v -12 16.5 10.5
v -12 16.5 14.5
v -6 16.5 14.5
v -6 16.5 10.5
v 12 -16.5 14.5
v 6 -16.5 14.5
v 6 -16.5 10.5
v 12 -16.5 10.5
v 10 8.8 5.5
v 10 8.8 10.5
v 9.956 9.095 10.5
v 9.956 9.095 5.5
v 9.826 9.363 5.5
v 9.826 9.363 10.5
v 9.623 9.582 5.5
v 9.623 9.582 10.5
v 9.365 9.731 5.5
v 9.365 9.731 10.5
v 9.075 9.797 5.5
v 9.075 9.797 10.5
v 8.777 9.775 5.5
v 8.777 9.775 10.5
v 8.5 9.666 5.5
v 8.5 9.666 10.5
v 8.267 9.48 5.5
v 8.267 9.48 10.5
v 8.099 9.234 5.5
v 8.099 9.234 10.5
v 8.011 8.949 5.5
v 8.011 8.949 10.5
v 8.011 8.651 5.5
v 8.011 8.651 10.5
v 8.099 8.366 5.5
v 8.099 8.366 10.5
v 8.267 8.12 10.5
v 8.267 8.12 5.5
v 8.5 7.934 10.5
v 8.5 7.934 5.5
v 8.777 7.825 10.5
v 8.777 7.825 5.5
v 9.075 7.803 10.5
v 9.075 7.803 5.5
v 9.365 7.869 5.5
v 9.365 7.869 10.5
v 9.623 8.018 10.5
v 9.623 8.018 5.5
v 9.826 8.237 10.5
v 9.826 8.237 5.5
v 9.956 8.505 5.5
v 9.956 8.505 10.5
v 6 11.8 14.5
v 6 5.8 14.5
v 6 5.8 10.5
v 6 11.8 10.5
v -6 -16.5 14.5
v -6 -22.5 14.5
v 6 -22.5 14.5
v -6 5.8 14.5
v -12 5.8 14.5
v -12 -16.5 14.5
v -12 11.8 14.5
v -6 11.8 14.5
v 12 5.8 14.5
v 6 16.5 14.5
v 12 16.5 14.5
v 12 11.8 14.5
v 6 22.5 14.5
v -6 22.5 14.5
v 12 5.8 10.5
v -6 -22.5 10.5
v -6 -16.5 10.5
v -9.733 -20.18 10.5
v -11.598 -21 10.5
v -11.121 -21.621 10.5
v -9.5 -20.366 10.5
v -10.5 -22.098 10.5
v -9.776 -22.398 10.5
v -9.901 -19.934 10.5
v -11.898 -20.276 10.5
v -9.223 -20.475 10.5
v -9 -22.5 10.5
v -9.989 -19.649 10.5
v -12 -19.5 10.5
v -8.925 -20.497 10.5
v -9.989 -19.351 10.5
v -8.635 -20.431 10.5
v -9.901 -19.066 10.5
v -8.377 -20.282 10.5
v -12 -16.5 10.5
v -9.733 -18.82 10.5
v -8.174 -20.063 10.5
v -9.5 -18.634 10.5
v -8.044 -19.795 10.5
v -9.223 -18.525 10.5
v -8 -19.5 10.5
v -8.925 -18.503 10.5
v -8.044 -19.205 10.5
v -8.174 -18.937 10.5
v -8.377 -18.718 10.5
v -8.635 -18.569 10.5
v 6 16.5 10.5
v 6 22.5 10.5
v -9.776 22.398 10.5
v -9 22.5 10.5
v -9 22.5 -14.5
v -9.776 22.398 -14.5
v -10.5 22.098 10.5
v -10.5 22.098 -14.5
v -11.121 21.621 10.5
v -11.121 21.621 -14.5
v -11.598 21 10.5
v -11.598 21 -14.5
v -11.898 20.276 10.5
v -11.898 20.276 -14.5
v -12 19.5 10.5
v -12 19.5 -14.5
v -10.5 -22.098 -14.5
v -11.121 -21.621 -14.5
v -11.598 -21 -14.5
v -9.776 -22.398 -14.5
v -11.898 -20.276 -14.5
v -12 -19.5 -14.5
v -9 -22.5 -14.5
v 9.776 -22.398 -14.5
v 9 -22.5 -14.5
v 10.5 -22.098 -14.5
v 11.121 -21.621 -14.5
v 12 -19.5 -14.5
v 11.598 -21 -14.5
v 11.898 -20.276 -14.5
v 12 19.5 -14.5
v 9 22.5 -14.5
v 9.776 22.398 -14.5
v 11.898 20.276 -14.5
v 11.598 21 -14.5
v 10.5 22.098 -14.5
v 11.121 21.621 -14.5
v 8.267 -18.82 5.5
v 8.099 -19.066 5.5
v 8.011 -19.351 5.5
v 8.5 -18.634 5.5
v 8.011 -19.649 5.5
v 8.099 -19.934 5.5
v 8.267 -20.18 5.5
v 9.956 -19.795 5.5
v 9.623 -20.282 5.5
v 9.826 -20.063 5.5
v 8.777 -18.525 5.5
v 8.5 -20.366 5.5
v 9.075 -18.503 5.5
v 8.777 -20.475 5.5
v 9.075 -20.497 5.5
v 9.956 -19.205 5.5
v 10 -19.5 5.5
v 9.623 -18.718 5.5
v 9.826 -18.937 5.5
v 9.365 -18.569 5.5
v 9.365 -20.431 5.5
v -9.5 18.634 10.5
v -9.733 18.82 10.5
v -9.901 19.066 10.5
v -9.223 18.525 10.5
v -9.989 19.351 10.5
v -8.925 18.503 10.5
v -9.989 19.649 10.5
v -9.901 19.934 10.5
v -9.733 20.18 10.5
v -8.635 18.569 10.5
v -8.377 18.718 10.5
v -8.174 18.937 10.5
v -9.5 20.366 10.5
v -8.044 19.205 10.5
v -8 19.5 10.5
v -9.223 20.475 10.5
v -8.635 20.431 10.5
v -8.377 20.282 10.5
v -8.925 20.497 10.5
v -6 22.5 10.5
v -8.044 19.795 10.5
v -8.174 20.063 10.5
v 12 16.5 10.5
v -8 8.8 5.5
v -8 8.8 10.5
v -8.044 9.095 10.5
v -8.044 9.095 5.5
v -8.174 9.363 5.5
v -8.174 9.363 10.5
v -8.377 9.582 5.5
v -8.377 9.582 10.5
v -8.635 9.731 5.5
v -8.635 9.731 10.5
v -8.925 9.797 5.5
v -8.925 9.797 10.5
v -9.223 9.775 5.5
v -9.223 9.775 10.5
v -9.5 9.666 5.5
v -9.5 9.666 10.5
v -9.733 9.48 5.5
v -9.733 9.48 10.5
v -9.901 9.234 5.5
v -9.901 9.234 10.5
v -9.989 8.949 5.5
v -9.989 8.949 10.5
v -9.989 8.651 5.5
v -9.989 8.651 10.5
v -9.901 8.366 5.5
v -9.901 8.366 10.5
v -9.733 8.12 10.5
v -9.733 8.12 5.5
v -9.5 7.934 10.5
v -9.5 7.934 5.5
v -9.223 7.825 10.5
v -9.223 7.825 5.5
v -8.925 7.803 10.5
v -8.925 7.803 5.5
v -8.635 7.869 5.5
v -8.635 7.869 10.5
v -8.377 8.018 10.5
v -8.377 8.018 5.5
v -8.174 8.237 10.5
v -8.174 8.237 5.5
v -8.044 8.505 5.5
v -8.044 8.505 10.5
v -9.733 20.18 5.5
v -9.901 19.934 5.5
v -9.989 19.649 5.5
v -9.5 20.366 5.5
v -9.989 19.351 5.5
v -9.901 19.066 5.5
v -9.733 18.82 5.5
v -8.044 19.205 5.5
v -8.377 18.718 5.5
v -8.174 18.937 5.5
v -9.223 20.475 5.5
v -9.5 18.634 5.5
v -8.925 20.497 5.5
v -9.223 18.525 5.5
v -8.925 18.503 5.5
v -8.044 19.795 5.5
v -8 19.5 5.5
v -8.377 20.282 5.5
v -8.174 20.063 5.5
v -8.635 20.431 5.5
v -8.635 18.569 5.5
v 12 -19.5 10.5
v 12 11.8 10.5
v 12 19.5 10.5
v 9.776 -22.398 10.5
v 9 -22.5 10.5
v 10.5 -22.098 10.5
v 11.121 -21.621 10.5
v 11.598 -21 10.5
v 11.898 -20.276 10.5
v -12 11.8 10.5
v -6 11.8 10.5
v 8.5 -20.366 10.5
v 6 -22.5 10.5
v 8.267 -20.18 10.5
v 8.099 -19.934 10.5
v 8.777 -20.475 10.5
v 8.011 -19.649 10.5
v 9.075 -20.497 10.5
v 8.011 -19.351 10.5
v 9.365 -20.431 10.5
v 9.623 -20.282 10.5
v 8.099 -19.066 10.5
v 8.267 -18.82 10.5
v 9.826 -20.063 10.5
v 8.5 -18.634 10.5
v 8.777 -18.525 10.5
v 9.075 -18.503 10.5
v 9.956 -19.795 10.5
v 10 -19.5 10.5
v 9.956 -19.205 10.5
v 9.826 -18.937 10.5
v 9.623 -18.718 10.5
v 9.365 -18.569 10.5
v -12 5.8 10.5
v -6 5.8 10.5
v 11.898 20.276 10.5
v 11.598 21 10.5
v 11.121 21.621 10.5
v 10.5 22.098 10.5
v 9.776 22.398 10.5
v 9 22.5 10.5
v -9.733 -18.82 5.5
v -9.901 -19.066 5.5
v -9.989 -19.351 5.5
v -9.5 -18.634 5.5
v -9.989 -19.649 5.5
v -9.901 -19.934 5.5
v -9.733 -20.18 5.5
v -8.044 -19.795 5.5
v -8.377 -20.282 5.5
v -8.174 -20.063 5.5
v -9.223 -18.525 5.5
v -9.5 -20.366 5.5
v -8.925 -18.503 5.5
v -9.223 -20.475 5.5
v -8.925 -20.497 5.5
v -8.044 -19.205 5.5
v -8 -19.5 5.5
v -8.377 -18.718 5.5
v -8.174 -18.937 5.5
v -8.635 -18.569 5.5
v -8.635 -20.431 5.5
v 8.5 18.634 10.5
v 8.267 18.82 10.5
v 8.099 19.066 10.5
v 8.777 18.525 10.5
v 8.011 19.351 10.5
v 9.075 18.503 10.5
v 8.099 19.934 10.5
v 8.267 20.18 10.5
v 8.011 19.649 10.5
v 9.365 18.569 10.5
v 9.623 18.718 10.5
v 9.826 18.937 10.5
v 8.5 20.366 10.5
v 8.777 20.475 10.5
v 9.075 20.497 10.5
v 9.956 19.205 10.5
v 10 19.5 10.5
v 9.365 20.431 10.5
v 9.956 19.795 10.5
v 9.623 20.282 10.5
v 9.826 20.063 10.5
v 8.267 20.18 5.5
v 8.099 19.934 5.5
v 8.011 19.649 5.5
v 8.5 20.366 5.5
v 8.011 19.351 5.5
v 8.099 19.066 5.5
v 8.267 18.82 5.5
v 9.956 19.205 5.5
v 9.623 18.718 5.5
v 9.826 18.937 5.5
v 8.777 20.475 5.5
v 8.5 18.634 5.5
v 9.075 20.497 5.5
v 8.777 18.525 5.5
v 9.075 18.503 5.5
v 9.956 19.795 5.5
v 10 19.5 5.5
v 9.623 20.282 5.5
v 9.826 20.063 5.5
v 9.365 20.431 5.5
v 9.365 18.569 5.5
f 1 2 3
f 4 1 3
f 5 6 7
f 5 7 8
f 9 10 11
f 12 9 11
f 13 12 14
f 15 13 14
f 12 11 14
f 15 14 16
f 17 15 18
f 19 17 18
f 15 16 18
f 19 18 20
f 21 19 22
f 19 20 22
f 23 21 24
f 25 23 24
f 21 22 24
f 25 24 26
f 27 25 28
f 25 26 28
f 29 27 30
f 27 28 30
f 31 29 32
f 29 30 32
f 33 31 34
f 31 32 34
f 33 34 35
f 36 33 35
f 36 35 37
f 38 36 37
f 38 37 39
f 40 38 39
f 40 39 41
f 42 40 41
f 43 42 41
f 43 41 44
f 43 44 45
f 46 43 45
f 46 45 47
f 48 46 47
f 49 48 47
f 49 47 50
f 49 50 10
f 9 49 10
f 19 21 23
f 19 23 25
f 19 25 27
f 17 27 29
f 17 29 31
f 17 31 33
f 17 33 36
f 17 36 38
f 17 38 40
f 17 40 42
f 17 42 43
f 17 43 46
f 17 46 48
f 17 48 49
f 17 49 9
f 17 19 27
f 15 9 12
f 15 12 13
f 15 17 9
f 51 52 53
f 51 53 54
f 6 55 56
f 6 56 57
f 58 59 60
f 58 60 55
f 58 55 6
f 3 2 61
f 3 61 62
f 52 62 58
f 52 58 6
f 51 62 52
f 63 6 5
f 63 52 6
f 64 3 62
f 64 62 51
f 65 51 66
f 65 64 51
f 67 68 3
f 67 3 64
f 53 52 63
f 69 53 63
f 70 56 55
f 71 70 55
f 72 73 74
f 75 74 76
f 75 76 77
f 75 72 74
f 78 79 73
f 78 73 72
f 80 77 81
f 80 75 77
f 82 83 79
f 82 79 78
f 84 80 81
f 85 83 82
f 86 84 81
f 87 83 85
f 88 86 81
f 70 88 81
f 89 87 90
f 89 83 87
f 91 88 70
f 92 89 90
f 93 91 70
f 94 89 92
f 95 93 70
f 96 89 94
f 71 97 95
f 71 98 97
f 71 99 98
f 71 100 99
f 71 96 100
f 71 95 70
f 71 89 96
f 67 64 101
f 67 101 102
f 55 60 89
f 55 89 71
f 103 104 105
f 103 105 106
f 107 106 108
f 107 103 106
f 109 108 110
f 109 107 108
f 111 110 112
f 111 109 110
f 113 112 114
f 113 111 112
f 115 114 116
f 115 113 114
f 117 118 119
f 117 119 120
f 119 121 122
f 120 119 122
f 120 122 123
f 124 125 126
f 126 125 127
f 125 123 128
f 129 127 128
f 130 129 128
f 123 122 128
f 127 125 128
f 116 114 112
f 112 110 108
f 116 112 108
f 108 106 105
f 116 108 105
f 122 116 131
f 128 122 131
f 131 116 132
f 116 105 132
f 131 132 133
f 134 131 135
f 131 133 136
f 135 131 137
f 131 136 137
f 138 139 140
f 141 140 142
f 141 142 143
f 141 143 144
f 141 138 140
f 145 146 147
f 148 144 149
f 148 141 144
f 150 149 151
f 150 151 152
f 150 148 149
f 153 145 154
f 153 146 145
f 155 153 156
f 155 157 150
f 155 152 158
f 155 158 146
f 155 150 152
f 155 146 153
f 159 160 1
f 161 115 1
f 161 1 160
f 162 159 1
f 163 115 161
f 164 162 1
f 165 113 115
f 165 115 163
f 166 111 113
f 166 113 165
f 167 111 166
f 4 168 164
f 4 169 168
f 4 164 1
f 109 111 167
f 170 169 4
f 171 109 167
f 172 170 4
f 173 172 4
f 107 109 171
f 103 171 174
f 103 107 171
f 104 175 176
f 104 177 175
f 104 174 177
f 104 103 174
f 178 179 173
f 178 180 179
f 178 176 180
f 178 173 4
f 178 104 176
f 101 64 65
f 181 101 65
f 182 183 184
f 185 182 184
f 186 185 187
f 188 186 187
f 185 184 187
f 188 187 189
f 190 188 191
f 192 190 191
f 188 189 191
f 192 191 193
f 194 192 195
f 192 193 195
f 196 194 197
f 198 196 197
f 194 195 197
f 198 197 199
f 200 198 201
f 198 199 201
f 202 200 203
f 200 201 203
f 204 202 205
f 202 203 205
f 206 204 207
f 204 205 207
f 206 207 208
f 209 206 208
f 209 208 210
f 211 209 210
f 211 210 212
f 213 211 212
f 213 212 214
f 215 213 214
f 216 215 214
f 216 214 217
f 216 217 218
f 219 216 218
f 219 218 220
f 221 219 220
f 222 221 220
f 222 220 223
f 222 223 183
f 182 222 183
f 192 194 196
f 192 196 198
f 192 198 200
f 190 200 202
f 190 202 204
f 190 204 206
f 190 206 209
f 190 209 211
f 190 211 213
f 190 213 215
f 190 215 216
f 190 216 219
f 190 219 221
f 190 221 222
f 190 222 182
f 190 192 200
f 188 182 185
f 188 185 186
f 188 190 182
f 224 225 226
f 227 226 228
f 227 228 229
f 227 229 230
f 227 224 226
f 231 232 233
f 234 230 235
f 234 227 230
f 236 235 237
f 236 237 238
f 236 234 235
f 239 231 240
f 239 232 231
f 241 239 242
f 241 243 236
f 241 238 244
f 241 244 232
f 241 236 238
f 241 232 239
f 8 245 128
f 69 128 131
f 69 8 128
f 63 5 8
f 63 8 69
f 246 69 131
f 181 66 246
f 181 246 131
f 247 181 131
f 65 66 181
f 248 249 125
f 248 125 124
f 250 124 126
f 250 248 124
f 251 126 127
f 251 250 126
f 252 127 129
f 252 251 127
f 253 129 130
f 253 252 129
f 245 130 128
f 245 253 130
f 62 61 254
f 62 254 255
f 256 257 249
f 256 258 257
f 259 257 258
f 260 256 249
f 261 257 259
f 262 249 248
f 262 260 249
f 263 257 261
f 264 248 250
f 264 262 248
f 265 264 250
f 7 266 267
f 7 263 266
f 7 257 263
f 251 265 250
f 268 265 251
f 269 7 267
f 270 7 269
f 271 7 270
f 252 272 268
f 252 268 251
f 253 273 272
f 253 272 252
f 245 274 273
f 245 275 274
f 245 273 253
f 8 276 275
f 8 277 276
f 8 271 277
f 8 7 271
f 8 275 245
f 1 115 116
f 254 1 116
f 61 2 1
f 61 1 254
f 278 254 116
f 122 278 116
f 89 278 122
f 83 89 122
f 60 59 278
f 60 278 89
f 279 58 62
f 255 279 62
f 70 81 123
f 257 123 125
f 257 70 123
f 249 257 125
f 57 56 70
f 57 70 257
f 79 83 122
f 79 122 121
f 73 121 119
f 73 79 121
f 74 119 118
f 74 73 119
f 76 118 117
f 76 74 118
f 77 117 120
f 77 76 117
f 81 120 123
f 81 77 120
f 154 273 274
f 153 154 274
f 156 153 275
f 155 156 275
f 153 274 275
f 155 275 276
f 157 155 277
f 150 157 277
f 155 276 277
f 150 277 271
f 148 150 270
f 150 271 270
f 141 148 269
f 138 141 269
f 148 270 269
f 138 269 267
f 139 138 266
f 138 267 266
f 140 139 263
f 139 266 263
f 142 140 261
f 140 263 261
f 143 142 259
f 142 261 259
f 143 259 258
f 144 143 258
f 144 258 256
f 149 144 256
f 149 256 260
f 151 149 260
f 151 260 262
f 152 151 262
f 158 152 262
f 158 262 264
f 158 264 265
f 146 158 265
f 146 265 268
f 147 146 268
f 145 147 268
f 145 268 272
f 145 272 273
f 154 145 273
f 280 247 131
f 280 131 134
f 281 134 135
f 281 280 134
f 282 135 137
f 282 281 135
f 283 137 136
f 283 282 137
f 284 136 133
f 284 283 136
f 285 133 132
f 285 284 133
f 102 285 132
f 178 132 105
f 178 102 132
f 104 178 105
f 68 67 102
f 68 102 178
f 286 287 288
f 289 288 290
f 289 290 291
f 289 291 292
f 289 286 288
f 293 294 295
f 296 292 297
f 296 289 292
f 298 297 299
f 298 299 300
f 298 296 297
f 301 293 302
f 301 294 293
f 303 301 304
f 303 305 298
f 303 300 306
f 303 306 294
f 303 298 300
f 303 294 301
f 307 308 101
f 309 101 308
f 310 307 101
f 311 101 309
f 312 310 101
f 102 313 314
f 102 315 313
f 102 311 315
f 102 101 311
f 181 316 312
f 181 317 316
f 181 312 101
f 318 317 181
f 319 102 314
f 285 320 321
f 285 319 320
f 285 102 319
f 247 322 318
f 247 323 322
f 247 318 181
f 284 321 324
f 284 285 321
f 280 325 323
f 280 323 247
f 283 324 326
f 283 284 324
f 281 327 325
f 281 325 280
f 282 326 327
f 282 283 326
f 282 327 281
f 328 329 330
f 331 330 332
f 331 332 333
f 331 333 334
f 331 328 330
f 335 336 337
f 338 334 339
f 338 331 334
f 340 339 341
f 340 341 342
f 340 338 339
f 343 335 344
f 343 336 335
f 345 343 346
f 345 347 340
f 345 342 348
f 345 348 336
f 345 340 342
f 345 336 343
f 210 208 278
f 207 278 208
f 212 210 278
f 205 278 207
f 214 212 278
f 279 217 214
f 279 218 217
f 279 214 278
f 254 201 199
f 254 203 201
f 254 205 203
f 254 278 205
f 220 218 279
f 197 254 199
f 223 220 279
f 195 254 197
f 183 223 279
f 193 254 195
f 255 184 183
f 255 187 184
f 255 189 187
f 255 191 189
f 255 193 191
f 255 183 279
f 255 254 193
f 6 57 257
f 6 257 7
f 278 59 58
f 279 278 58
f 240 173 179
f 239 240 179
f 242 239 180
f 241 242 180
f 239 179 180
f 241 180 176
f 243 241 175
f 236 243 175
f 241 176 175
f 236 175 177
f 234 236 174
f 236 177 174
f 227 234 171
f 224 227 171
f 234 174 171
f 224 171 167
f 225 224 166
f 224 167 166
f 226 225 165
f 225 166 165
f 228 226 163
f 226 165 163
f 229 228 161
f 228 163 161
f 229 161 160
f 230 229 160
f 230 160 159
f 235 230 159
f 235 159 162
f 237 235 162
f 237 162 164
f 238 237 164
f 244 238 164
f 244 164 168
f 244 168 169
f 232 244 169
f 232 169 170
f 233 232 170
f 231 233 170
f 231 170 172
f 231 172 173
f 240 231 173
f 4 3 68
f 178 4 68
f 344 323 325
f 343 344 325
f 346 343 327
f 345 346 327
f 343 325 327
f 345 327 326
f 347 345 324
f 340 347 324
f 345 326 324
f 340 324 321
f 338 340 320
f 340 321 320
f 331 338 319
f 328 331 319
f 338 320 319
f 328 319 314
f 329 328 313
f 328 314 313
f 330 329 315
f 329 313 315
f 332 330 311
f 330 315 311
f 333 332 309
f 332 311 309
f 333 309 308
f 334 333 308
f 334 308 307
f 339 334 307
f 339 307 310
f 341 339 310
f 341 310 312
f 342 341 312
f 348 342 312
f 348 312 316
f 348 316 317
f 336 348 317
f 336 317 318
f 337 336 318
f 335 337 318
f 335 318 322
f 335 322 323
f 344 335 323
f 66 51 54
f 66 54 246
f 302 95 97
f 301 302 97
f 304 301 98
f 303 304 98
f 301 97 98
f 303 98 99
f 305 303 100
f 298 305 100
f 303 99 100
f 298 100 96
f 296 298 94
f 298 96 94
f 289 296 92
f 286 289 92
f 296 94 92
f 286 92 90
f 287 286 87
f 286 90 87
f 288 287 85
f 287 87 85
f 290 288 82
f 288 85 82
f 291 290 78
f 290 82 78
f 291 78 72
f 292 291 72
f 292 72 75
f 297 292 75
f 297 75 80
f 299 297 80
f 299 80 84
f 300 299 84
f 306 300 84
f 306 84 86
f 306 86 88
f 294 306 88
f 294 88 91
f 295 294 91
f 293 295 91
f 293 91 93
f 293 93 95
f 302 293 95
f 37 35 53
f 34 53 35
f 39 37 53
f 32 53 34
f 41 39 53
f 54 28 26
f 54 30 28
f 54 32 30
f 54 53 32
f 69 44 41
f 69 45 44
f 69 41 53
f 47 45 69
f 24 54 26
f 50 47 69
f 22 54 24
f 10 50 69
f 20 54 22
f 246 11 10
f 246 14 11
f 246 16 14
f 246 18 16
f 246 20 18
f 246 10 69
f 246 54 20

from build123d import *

# Parameters (mm, degrees)
BOSS_EXTRU_1_DEPTH      = 14.5
ESQUISSE2_R             = 1
ENL_V_MAT_EXTRU_1_DEPTH = 9
ESQUISSE4_W             = 6
ESQUISSE4_H             = 6
ENL_V_MAT_EXTRU_2_DEPTH = 4


with BuildPart() as part:
    # Esquisse1 → Boss.-Extru.1 (new, symmetric)
    with BuildSketch(Plane.XY):
        with BuildLine():
            Line((-9, -22.5), (9, -22.5))
            ThreePointArc((9, -22.5), (11.121320344, -21.621320344), (12, -19.5))
            Line((12, -19.5), (12, 19.5))
            ThreePointArc((12, 19.5), (11.121320344, 21.621320344), (9, 22.5))
            Line((9, 22.5), (-9, 22.5))
            ThreePointArc((-9, 22.5), (-11.121320344, 21.621320344), (-12, 19.5))
            Line((-12, 19.5), (-12, -19.5))
            ThreePointArc((-12, -19.5), (-11.121320344, -21.621320344), (-9, -22.5))
        make_face()
    extrude(amount=BOSS_EXTRU_1_DEPTH, both=True)

    # Esquisse2 → Enlèv. mat.-Extru.1 (cut)
    with BuildSketch(Plane.XY.offset(14.5)):
        with Locations((9, 19.5)):
            Circle(ESQUISSE2_R)
        with Locations((-9, 19.5)):
            Circle(ESQUISSE2_R)
        with Locations((-9, 8.8)):
            Circle(ESQUISSE2_R)
        with Locations((9, 8.8)):
            Circle(ESQUISSE2_R)
        with Locations((-9, -19.5)):
            Circle(ESQUISSE2_R)
        with Locations((9, -19.5)):
            Circle(ESQUISSE2_R)
    extrude(amount=-ENL_V_MAT_EXTRU_1_DEPTH, mode=Mode.SUBTRACT)

    # Esquisse4 → Enlèv. mat.-Extru.2 (cut)
    with BuildSketch(Plane.XY.offset(14.5)):
        with Locations((-9, 19.5)):
            Rectangle(ESQUISSE4_W, ESQUISSE4_H)
        with Locations((9, 19.5)):
            Rectangle(ESQUISSE4_W, ESQUISSE4_H)
        with Locations((9, 8.8)):
            Rectangle(ESQUISSE4_W, ESQUISSE4_H)
        with Locations((-9, 8.8)):
            Rectangle(ESQUISSE4_W, ESQUISSE4_H)
        with Locations((-9, -19.5)):
            Rectangle(ESQUISSE4_W, ESQUISSE4_H)
        with Locations((9, -19.5)):
            Rectangle(ESQUISSE4_W, ESQUISSE4_H)
    extrude(amount=-ENL_V_MAT_EXTRU_2_DEPTH, mode=Mode.SUBTRACT)


solid = part.part
